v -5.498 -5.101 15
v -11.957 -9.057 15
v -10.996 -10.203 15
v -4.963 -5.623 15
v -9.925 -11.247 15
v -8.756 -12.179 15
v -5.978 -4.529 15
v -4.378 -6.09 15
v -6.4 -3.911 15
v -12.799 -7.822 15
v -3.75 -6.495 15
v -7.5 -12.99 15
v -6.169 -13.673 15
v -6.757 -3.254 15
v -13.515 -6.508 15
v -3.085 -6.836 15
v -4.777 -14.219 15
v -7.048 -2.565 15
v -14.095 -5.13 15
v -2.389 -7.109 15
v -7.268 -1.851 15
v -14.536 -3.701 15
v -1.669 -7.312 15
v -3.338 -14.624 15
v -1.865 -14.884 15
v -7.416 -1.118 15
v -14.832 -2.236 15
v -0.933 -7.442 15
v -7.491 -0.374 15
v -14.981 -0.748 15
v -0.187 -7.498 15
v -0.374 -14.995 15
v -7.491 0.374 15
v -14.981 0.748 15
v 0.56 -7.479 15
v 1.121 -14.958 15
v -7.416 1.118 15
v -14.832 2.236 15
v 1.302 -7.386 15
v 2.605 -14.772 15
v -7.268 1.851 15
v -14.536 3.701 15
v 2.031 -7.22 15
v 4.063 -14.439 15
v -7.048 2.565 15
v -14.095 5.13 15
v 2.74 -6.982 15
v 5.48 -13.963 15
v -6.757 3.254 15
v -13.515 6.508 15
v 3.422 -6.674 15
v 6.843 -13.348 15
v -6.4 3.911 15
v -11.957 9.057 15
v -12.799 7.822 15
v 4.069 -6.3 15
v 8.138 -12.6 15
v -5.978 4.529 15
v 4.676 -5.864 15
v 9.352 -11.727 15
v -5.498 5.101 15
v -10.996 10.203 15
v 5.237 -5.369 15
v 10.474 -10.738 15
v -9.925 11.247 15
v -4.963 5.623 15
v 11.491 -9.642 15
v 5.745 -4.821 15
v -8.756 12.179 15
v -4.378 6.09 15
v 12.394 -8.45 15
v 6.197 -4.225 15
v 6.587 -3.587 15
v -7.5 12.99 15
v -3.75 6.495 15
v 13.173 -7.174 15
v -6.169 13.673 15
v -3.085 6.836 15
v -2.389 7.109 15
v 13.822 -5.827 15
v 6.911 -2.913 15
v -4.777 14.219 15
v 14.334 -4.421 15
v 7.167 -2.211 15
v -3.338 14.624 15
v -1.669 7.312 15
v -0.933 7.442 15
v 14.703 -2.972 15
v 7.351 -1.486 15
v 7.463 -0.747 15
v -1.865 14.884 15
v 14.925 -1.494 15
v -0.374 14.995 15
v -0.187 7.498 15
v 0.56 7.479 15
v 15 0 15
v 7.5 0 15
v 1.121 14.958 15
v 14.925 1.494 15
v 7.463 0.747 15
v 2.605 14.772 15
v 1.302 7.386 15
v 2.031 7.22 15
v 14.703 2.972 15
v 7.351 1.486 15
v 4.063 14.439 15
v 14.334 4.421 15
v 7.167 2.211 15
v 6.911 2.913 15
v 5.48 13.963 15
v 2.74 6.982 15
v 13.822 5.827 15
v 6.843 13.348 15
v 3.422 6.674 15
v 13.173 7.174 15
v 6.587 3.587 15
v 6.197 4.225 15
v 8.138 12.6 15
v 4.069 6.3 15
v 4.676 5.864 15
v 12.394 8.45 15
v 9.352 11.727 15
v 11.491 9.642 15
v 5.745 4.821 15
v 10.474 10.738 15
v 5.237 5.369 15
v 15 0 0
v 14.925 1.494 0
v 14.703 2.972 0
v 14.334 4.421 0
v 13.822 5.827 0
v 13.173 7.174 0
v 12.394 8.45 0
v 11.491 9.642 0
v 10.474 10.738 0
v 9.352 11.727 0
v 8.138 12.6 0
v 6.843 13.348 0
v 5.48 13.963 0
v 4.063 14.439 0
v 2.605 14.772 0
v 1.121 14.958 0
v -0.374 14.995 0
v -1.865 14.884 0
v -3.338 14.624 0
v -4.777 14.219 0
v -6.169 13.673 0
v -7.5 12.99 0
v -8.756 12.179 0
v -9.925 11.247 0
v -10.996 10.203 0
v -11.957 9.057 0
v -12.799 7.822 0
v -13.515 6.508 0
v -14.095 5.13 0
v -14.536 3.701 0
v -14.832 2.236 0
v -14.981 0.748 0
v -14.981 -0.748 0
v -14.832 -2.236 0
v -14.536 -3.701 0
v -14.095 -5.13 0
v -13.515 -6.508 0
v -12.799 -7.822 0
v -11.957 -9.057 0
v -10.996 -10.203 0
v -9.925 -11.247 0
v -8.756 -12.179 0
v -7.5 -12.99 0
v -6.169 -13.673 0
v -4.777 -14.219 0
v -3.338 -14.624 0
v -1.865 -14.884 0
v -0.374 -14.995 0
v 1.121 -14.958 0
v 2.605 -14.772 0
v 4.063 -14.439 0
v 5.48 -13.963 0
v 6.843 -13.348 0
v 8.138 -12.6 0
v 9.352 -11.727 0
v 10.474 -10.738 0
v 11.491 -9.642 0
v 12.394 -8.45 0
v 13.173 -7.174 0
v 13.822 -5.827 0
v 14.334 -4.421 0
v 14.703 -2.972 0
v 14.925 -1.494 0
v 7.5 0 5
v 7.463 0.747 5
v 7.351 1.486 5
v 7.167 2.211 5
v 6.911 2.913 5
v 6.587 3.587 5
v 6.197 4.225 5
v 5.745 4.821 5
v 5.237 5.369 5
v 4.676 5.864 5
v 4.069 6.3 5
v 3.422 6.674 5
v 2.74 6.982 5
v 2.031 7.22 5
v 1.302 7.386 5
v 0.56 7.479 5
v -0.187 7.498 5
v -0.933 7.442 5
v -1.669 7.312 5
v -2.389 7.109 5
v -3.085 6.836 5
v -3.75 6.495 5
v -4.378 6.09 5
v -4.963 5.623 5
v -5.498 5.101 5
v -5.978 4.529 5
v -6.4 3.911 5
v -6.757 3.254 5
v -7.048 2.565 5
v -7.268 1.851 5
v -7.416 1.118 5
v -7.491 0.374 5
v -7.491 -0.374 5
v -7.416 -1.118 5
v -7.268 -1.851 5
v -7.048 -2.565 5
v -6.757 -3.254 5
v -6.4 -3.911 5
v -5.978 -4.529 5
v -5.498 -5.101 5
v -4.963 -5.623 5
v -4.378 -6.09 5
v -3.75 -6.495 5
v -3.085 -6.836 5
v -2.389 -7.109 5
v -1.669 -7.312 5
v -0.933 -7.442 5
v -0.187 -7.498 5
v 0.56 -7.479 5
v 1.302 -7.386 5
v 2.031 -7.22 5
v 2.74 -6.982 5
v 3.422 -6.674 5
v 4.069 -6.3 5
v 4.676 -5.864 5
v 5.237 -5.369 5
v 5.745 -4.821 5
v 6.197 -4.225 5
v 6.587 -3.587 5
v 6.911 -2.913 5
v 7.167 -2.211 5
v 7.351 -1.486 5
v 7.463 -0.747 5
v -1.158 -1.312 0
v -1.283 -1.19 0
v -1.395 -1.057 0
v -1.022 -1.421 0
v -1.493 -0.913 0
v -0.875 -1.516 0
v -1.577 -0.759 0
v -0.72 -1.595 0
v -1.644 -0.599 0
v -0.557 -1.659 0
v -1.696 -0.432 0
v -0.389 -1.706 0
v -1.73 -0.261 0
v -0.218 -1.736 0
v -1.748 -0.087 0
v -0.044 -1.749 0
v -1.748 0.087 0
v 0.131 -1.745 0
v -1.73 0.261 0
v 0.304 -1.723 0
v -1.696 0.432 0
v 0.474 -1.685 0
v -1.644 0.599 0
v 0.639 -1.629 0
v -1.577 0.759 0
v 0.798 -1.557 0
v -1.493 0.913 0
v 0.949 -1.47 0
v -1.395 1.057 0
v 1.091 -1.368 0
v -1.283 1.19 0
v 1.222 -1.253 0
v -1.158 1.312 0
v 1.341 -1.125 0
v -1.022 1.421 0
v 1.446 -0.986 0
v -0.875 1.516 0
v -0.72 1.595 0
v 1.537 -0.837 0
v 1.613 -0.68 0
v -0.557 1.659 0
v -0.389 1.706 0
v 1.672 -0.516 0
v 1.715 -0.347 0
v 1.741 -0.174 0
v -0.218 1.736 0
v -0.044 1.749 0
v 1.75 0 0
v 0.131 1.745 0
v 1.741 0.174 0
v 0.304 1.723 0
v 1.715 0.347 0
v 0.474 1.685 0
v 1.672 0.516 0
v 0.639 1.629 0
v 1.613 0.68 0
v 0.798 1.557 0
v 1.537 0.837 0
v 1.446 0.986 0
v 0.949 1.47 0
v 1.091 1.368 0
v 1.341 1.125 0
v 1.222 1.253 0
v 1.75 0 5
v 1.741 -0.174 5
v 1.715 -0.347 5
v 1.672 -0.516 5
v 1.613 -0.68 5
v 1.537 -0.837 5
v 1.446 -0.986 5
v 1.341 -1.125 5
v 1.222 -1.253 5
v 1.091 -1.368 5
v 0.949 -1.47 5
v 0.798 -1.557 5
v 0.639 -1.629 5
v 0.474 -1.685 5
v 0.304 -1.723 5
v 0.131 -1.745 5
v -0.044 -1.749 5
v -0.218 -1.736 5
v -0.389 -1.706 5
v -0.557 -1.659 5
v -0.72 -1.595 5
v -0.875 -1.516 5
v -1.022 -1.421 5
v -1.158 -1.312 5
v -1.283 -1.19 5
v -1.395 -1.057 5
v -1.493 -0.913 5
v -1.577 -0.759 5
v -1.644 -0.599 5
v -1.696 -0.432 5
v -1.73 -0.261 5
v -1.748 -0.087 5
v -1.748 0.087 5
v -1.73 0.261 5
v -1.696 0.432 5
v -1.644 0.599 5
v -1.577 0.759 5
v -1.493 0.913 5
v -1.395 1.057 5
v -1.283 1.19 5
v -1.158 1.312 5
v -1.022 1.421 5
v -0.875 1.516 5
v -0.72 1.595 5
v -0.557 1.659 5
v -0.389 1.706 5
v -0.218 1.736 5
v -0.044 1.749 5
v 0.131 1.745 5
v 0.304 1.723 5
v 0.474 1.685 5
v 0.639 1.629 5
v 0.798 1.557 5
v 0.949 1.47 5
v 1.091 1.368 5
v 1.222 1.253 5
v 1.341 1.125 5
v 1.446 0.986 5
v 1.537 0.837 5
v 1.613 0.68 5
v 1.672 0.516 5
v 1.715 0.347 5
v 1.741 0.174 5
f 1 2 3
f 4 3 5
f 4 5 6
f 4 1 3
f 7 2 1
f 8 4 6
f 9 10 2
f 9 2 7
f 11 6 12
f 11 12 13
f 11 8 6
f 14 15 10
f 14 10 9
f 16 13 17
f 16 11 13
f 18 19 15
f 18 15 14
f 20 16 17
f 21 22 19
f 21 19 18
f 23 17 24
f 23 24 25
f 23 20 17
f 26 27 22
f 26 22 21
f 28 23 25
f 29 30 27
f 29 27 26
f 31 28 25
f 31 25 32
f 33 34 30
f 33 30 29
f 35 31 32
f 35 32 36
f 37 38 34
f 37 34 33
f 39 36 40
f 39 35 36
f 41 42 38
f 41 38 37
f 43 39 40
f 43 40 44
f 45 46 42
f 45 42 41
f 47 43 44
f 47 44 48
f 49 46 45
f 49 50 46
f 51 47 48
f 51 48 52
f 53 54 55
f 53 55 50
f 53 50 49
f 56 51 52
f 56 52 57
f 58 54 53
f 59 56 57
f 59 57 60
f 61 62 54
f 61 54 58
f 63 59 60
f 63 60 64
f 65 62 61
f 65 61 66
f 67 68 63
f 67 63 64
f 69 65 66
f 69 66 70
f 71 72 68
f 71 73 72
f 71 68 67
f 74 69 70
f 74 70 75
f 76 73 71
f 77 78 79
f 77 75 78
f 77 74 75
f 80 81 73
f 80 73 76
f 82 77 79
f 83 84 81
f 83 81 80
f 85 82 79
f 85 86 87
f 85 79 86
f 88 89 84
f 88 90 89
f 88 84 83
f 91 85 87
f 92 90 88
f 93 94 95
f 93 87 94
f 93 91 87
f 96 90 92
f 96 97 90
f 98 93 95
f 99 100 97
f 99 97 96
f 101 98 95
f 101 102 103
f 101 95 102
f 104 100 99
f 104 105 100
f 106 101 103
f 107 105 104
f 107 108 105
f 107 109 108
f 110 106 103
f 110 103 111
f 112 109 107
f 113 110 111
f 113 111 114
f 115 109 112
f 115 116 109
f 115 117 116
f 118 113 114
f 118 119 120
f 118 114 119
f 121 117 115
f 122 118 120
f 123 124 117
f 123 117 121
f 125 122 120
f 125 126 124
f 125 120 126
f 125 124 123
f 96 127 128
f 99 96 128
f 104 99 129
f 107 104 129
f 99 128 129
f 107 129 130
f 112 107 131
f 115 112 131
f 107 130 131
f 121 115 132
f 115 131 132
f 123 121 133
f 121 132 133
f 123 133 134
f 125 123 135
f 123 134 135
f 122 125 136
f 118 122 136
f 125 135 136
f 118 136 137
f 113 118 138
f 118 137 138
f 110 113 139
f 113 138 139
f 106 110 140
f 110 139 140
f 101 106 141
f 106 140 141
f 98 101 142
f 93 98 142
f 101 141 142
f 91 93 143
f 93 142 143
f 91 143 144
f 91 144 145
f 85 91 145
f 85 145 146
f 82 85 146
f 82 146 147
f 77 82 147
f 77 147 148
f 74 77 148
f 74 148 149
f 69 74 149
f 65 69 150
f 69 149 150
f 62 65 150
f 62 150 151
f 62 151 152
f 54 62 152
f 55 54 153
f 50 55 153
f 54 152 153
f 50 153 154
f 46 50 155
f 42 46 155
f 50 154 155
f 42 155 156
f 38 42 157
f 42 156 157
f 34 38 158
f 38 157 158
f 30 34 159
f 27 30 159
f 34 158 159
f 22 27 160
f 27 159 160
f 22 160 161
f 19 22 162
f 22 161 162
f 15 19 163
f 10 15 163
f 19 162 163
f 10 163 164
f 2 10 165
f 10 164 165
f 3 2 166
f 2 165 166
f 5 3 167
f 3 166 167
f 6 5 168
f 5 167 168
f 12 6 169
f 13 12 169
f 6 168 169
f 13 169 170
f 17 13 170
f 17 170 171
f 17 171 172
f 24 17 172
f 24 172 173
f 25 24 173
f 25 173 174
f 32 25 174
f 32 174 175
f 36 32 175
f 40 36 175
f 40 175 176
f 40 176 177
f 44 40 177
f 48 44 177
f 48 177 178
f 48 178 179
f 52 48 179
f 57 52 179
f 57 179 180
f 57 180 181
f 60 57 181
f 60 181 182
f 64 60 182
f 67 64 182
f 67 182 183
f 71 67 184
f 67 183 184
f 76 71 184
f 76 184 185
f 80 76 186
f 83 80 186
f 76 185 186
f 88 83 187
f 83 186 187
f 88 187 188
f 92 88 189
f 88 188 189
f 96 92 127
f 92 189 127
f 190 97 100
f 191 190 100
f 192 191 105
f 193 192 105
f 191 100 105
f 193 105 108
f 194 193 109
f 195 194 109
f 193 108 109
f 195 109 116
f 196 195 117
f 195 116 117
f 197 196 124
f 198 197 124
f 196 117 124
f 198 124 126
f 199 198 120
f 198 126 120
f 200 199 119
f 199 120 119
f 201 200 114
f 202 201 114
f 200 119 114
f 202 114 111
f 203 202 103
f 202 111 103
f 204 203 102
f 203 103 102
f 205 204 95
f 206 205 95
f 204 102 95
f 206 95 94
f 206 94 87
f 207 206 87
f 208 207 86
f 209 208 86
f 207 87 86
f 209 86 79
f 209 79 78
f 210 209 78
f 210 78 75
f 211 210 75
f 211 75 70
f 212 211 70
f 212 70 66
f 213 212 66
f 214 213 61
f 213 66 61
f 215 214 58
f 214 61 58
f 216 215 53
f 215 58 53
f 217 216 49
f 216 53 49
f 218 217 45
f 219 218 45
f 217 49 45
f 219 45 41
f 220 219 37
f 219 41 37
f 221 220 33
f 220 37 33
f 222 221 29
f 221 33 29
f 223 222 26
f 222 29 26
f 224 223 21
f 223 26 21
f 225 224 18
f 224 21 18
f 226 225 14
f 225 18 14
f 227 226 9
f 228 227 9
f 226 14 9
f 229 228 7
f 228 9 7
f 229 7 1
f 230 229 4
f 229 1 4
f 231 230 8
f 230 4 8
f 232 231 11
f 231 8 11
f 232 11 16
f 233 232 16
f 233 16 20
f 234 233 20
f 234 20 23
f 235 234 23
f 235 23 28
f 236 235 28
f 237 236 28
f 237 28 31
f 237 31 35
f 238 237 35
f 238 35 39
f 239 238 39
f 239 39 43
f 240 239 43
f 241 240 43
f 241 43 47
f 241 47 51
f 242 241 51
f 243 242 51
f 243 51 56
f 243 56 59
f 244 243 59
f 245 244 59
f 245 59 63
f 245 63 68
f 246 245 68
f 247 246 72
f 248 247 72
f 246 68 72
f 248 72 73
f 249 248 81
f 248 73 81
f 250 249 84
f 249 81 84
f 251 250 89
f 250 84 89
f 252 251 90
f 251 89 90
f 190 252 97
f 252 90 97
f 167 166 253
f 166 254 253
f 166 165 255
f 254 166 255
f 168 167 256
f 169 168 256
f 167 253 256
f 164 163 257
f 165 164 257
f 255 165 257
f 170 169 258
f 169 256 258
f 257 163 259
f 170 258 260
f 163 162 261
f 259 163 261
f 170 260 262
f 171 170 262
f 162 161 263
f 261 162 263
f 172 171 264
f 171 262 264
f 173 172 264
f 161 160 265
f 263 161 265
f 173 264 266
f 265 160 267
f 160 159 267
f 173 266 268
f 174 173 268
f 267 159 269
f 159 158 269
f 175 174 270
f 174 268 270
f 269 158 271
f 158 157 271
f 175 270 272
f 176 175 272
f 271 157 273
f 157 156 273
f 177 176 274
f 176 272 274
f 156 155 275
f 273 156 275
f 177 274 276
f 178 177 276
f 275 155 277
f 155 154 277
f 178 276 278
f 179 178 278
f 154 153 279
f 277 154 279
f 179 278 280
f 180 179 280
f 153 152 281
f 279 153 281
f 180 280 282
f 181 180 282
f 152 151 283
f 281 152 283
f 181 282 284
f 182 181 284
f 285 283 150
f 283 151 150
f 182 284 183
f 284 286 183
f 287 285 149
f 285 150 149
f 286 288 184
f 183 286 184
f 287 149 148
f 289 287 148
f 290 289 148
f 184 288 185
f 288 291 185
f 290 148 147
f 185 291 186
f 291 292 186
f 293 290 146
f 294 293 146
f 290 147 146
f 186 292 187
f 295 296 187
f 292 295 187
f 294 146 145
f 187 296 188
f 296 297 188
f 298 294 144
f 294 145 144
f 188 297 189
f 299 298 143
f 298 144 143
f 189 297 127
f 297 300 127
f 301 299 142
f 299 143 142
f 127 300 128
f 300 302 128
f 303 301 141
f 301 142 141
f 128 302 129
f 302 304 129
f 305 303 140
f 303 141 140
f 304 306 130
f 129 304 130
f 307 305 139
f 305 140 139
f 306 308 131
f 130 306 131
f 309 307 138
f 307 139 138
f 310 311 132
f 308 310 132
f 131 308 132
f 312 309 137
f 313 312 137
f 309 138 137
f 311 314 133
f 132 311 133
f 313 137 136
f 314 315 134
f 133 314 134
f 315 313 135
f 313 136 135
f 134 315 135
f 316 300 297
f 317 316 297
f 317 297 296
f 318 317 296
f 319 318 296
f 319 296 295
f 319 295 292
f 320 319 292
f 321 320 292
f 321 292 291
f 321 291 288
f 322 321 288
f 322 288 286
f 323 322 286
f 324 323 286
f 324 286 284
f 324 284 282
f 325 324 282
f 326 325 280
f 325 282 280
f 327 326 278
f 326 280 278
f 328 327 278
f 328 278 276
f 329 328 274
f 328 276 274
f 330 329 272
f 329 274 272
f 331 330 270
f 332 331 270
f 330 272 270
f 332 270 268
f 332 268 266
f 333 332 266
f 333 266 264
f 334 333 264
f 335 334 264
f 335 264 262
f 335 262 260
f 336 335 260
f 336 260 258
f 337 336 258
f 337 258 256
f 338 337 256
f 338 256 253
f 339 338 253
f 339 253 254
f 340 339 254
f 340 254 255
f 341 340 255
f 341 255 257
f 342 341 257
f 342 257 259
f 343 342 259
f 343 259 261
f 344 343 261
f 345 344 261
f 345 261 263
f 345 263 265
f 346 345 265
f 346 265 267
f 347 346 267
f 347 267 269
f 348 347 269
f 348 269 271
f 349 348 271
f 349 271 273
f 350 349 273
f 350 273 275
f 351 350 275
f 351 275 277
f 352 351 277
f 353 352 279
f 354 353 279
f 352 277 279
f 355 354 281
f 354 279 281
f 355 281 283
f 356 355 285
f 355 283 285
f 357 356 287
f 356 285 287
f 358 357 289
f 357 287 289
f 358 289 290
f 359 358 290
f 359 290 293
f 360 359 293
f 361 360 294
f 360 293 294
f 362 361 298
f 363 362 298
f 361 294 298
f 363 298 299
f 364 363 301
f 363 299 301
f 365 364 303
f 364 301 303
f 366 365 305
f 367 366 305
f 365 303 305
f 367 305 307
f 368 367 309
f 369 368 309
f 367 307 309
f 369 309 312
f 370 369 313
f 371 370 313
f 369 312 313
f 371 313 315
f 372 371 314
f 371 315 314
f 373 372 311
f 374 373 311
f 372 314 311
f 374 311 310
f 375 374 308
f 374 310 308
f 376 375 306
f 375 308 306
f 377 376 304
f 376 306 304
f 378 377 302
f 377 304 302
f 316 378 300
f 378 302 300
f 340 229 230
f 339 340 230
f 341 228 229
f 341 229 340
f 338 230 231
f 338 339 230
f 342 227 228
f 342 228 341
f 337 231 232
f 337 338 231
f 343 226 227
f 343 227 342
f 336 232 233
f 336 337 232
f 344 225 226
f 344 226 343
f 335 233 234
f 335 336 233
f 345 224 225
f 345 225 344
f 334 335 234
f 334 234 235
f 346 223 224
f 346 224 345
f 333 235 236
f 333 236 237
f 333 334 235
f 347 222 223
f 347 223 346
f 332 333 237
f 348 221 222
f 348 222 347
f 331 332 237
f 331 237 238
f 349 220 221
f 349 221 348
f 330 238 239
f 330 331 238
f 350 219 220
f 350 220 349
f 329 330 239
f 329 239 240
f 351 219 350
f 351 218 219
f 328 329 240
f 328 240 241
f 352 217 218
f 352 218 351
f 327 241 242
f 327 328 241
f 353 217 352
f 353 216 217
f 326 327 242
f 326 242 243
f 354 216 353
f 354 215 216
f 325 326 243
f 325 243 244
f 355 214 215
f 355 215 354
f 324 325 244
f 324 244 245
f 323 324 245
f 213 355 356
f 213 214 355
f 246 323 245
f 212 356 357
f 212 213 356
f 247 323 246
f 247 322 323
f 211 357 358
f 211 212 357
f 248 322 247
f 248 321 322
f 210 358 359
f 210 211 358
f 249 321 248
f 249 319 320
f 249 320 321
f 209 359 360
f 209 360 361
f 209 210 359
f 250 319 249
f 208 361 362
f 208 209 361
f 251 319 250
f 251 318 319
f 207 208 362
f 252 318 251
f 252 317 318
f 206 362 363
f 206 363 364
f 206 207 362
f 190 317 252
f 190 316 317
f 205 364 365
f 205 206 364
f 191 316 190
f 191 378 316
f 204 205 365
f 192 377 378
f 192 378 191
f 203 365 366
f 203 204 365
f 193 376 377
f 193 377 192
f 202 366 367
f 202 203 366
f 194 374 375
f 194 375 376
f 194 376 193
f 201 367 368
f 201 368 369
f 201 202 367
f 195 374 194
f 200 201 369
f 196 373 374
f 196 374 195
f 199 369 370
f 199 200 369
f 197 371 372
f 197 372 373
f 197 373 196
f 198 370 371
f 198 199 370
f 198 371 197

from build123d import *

# Parameters (mm, degrees)
SKETCH_R        = 15
PAD_DEPTH       = 15
SKETCH001_R     = 7.5
POCKET_DEPTH    = 10
SKETCH002_R     = 1.75
POCKET001_DEPTH = 10


with BuildPart() as part:
    # Sketch → Pad (new body)
    with BuildSketch(Plane.XY):
        Circle(SKETCH_R)
    extrude(amount=PAD_DEPTH)

    # Sketch001 (on Face3 of Pad) → Pocket (cut)
    with BuildSketch(Plane.XY.offset(15)):
        Circle(SKETCH001_R)
    extrude(amount=-POCKET_DEPTH, mode=Mode.SUBTRACT)

    # Sketch002 (on Face2 of Pocket) → Pocket001 (cut)
    with BuildSketch(Plane(origin=(0, 0, 0), x_dir=(1, 0, 0), z_dir=(0, 0, -1))):
        Circle(SKETCH002_R)
    extrude(amount=-POCKET001_DEPTH, mode=Mode.SUBTRACT)


solid = part.part
